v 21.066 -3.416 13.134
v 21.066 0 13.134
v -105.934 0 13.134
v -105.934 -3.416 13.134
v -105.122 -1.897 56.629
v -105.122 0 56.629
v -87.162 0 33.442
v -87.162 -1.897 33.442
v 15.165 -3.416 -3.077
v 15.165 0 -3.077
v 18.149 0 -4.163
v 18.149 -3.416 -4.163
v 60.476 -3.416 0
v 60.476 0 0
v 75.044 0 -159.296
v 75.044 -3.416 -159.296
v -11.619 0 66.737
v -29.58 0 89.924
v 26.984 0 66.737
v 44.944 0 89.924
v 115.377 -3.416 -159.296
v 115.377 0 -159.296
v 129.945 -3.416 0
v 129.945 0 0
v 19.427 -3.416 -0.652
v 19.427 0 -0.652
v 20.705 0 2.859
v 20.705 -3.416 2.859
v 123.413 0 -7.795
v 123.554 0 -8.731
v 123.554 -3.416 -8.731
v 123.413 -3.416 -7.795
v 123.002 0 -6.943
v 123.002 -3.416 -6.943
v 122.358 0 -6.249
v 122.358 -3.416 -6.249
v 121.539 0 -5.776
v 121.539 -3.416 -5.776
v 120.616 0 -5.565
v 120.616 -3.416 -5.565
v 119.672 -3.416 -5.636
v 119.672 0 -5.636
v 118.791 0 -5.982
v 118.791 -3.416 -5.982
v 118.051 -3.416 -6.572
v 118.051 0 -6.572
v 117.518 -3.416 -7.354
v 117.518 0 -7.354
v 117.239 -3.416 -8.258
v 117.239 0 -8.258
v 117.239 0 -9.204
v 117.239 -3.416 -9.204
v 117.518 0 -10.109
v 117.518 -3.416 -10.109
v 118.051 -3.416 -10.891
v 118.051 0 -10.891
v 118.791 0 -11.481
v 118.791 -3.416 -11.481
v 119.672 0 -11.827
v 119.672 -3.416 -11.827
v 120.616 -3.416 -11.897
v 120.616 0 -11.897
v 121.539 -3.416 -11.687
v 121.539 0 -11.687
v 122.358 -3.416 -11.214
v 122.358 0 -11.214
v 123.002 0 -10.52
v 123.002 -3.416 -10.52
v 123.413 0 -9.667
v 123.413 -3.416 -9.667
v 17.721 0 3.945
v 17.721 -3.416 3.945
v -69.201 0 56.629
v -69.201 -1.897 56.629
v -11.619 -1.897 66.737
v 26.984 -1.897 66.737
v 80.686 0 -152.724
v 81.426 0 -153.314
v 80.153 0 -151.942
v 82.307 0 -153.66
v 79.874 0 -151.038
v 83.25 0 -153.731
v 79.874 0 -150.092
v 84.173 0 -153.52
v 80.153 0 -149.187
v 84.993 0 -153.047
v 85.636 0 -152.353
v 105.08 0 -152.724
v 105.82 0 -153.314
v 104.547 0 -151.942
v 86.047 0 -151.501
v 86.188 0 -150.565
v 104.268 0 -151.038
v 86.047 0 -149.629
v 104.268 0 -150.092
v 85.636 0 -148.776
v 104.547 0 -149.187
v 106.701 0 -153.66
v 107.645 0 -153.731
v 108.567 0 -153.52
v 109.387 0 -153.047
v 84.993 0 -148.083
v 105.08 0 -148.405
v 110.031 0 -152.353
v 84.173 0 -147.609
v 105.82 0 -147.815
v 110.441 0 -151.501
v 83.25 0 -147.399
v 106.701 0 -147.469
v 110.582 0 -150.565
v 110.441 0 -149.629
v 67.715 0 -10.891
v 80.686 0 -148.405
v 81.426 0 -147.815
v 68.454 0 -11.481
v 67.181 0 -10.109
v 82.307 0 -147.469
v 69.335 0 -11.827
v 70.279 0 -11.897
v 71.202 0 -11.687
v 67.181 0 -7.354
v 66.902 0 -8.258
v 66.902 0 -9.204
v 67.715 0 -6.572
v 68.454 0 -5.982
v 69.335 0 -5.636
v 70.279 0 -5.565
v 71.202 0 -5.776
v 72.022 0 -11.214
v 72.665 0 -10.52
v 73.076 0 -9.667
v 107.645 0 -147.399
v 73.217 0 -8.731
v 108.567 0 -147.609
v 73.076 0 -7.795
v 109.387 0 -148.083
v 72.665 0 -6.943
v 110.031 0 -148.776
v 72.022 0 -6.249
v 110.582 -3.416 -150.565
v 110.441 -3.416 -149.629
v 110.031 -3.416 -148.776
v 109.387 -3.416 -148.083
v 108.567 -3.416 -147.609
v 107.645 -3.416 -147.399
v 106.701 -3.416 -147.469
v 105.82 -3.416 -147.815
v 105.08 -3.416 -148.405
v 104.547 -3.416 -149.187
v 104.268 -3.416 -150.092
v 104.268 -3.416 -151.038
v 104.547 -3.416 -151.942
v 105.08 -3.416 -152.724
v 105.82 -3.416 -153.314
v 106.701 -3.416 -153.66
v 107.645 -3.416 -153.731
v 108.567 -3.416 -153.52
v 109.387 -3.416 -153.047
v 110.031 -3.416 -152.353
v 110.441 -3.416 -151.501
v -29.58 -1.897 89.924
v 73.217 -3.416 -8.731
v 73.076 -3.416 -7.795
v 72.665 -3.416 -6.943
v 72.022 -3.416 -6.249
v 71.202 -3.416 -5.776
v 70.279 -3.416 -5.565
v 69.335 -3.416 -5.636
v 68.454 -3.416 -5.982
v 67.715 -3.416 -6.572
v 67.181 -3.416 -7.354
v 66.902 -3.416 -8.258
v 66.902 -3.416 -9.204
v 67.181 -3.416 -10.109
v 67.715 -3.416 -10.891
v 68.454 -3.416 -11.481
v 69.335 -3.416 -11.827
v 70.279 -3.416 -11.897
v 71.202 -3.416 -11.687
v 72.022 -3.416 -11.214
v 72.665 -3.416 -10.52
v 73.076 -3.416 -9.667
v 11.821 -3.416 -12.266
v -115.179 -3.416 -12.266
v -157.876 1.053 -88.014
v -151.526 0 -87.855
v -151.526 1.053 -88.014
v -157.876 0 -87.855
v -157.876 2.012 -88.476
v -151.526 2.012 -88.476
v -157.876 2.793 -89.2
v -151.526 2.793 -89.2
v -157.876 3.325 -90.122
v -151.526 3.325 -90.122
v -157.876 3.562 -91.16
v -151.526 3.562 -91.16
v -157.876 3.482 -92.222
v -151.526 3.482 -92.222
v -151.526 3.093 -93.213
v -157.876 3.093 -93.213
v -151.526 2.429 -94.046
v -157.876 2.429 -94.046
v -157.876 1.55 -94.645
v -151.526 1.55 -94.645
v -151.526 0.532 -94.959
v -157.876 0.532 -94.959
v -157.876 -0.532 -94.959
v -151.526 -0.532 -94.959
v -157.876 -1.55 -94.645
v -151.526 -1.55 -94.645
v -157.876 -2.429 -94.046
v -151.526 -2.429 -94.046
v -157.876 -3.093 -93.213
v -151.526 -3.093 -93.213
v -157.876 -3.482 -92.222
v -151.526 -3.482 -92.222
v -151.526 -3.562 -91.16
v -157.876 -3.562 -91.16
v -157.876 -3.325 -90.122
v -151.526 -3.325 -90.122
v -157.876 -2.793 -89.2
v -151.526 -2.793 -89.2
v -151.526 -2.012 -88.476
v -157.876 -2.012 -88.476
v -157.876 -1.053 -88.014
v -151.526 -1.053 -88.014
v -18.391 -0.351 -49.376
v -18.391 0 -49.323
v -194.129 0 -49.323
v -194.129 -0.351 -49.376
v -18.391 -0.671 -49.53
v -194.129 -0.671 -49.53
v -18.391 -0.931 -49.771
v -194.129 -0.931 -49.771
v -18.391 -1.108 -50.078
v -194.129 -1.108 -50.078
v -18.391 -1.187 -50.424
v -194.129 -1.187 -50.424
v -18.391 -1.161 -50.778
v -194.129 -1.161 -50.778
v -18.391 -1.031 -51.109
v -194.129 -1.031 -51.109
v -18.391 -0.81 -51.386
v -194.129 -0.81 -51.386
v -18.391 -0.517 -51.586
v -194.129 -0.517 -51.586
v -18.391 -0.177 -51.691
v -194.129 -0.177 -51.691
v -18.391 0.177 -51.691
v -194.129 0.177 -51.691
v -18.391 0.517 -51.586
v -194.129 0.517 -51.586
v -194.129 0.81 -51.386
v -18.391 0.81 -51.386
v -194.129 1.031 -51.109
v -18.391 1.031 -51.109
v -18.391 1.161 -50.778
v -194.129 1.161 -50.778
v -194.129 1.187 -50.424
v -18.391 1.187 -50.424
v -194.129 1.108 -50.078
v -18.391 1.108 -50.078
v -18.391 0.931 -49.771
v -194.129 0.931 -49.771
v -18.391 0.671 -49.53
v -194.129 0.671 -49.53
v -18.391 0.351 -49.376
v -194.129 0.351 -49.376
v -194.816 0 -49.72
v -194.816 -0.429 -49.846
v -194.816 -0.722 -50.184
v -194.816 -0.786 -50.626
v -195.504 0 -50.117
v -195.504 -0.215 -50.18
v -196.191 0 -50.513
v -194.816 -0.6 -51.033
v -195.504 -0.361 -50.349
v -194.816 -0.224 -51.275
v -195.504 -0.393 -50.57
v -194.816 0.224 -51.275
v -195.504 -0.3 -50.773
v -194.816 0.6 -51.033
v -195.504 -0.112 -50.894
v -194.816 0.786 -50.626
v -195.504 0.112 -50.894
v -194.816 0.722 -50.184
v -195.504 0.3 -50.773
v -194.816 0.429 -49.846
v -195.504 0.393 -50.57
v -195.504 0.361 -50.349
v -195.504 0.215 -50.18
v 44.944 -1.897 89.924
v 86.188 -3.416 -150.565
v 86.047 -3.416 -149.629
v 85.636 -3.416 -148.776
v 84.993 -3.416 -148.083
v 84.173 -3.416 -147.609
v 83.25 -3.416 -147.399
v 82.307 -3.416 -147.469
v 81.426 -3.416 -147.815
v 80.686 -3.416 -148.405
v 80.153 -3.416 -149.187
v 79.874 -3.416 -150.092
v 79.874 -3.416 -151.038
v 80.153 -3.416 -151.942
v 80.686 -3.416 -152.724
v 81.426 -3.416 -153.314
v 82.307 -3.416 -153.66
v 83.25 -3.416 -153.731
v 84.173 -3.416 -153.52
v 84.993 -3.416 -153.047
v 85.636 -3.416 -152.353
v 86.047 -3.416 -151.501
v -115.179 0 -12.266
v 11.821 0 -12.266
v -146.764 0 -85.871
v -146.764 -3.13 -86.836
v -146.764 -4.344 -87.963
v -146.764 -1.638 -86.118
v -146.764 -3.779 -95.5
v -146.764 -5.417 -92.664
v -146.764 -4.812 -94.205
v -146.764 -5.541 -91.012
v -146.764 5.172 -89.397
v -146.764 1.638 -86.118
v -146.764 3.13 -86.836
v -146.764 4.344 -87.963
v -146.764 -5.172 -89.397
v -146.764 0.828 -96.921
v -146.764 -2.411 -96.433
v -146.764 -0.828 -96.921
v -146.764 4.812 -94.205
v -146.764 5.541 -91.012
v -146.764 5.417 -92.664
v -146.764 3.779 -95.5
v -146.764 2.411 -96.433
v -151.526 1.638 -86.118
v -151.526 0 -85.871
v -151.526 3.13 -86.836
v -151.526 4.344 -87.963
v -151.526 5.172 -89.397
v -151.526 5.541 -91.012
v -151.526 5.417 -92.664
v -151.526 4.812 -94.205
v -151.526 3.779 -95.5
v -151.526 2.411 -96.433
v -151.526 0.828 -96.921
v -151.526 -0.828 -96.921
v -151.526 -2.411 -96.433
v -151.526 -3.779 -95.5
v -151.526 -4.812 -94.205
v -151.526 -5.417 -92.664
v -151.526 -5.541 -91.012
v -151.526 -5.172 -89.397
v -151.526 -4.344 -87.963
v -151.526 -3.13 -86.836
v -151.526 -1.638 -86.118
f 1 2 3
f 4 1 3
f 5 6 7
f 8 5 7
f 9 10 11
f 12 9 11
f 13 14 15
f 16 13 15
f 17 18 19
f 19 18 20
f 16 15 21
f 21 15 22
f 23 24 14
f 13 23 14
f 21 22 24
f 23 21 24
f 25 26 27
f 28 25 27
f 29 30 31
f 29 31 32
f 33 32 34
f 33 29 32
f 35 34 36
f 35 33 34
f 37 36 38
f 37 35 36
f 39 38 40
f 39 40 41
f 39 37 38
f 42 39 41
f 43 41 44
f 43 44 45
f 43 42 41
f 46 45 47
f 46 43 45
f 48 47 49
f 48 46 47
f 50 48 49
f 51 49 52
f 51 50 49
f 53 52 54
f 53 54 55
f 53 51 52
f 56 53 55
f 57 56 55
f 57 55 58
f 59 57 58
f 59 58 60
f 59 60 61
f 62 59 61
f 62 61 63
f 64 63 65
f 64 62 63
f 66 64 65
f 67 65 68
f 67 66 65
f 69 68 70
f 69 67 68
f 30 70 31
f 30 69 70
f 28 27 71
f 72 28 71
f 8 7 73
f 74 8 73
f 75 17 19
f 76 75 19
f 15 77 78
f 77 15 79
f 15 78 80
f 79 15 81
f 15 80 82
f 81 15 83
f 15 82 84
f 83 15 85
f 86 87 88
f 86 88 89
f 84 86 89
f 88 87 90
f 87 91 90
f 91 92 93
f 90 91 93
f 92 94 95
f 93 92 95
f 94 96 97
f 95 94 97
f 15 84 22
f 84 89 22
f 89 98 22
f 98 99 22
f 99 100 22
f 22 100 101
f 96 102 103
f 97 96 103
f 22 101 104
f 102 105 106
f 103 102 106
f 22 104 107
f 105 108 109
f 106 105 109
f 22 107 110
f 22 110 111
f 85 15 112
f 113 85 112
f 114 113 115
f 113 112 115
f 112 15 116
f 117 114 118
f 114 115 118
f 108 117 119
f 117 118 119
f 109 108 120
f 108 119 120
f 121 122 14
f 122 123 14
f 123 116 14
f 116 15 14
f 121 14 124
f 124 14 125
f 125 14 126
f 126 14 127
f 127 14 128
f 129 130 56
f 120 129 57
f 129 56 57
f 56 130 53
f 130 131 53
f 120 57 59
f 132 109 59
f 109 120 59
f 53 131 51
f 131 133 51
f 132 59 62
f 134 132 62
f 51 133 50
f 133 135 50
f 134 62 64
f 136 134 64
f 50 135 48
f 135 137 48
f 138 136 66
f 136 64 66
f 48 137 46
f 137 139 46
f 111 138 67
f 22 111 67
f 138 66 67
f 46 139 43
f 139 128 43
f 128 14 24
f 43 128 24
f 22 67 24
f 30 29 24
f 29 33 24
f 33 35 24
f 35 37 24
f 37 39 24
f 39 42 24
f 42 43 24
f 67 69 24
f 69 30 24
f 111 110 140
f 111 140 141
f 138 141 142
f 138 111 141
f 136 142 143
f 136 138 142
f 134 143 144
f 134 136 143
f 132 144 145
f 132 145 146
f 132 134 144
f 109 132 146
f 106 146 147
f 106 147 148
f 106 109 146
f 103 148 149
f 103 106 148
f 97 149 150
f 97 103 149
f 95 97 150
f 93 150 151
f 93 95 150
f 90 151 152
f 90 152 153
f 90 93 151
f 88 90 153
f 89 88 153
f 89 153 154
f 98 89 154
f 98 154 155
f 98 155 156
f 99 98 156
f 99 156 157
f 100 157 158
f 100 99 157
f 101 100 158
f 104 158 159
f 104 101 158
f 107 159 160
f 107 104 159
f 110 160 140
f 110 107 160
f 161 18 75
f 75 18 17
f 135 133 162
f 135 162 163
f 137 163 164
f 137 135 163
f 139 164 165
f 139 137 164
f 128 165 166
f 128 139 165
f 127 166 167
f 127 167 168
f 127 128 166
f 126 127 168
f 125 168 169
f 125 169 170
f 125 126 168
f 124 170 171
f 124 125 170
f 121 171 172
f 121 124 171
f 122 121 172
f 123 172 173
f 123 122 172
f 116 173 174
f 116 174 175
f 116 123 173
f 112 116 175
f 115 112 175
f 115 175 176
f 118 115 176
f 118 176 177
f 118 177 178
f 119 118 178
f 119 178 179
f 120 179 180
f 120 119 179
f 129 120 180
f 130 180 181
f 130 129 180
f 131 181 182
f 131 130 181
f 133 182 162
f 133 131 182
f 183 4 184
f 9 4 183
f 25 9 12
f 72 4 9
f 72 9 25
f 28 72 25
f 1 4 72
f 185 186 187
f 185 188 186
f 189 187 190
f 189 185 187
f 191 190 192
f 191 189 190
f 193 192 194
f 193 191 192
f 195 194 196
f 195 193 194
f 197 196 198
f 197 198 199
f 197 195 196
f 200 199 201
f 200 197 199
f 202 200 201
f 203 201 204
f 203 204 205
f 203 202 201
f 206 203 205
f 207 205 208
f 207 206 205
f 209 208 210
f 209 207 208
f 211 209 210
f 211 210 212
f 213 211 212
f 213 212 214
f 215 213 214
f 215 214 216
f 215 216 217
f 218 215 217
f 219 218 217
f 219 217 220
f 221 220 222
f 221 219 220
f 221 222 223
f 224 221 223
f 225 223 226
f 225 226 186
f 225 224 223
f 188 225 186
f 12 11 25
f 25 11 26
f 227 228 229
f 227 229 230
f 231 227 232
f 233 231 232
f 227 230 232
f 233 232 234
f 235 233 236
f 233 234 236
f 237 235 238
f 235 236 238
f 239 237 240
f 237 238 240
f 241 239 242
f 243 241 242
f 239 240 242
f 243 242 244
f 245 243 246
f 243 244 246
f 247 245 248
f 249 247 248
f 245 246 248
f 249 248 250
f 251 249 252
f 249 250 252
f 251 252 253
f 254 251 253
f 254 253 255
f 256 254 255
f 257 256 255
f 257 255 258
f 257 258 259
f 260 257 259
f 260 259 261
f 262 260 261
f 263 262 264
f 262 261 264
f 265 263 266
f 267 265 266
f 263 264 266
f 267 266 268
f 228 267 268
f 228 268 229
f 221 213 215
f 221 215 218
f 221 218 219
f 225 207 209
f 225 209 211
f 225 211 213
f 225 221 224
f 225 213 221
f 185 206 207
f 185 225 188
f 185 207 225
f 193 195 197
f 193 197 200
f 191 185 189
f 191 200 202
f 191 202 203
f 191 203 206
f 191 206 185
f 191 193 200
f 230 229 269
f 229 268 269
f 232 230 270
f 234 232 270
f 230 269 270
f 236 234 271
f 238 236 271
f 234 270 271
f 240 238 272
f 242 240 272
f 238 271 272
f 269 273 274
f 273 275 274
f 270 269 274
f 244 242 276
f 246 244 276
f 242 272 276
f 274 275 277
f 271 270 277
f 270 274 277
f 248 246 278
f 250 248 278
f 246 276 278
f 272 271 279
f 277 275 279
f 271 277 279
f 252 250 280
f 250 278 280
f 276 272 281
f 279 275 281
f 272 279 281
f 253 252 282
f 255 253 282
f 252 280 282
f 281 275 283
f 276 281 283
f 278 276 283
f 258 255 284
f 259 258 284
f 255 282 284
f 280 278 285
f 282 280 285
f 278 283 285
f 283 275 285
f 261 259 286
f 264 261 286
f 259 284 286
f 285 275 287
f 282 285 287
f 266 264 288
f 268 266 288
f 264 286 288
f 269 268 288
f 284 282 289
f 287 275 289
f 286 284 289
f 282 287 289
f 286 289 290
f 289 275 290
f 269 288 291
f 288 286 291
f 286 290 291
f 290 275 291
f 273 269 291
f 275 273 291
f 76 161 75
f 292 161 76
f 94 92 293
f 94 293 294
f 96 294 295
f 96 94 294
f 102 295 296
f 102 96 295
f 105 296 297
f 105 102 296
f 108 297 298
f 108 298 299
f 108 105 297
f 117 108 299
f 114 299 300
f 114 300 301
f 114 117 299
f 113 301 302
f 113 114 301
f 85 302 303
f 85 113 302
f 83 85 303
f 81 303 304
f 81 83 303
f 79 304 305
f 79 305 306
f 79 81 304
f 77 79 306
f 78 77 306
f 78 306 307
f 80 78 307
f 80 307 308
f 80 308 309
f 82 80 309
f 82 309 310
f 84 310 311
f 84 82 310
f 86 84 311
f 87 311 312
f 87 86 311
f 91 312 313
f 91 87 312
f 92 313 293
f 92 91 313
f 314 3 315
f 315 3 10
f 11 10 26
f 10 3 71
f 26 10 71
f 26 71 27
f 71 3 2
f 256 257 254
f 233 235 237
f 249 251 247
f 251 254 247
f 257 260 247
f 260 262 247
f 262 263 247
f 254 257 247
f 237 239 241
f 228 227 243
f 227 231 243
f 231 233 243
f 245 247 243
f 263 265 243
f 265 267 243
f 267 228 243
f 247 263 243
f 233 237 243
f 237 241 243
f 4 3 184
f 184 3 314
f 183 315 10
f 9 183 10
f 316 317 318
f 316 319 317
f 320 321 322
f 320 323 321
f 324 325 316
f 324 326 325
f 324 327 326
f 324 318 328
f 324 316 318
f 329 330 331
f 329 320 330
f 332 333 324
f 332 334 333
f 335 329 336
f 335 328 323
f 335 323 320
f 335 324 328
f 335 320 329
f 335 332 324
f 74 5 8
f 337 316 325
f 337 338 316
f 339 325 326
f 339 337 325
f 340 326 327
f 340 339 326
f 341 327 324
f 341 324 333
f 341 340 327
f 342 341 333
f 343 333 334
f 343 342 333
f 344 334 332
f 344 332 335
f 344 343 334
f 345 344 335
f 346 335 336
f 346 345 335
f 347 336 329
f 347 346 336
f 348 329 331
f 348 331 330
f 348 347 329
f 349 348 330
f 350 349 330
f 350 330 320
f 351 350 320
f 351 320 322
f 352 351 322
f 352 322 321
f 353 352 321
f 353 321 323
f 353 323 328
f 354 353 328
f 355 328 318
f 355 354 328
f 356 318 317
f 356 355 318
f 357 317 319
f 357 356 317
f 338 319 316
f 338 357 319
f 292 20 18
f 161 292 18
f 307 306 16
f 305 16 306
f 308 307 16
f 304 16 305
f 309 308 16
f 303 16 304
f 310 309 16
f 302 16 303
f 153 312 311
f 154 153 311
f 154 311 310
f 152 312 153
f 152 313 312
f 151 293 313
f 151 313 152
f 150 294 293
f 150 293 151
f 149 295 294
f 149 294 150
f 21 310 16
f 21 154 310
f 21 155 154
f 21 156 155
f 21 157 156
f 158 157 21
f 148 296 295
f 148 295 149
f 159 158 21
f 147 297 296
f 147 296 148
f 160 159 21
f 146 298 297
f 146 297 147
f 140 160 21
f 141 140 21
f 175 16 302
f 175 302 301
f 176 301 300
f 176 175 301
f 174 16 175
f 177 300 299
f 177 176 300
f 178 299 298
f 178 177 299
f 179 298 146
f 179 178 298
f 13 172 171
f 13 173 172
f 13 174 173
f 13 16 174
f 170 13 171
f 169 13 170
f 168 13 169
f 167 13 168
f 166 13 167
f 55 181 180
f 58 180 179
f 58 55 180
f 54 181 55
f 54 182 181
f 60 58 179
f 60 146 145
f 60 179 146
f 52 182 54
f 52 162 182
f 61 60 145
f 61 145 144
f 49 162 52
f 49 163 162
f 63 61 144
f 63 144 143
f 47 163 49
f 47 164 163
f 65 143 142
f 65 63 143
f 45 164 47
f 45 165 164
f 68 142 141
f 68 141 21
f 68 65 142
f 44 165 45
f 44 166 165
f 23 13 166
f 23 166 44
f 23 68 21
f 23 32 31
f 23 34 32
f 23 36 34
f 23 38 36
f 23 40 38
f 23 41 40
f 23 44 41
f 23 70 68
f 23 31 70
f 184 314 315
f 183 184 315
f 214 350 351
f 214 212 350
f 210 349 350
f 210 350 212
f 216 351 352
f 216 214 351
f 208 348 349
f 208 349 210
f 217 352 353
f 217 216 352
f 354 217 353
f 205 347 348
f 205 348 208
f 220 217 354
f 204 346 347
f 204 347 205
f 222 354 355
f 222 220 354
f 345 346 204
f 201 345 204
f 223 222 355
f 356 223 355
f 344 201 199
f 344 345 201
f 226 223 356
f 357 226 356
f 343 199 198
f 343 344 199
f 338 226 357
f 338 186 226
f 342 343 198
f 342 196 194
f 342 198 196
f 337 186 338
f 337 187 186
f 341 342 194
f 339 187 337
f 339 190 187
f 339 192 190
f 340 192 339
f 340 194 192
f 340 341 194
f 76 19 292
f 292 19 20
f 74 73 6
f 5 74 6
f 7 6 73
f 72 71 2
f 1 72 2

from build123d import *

# Parameters (mm, degrees)
F1_DEPTH = 3.4163
F3_DEPTH = 1.89738
F5_DEPTH = 1.89738
F6_R     = 3.175
F7_DEPTH = 3.4163


with BuildPart() as f1:
    # F0 (on Front) → F1 (new body)
    with BuildSketch(Plane.XZ):
        Polygon((-115.179243, -12.266104), (11.820757, -12.266104), (15.165372, -3.076849), (18.148896, -4.162763), (19.426703, -0.652018), (20.70451, 2.858728), (17.720986, 3.944642), (21.065601, 13.133896), (-105.934399, 13.133896), align=None)
    extrude(amount=F1_DEPTH)


with BuildPart() as f3:
    # F2 (on Front) → F3 (new body)
    with BuildSketch(Plane.XZ):
        Polygon((-87.161818, 56.629179), (-105.122158, 56.629179), (-87.161818, 33.442141), (-69.201478, 56.629179), align=None)
    extrude(amount=F3_DEPTH)


with BuildPart() as f5:
    # F4 (on Front) → F5 (new body)
    with BuildSketch(Plane.XZ):
        Polygon((-11.619255, 89.924287), (-29.579595, 89.924287), (-11.619255, 66.737249), (6.341085, 89.924287), align=None)
        Polygon((6.341085, 89.924287), (-11.619255, 66.737249), (26.983665, 66.737249), (9.023325, 89.924287), align=None)
        Polygon((9.023325, 89.924287), (26.983665, 66.737249), (44.944005, 89.924287), (26.983665, 89.924287), align=None)
    extrude(amount=F5_DEPTH)


with BuildPart() as f7:
    # F6 (on Front) → F7 (new body)
    with BuildSketch(Plane.XZ):
        Polygon((75.043939, -159.2961), (95.210269, -159.2961), (115.376599, -159.2961), (129.944769, 0), (95.210269, 0), (60.475769, 0), align=None)
        with Locations((83.013124, -150.56485)):
            Circle(F6_R, mode=Mode.SUBTRACT)
        with Locations((107.407415, -150.56485)):
            Circle(F6_R, mode=Mode.SUBTRACT)
        with Locations((70.041959, -8.73125)):
            Circle(F6_R, mode=Mode.SUBTRACT)
        with Locations((120.37858, -8.73125)):
            Circle(F6_R, mode=Mode.SUBTRACT)
    extrude(amount=F7_DEPTH)


with BuildPart() as f9:
    # F8 (on Front) → F9 (revolve)
    with BuildSketch(Plane.XZ):
        Polygon((-151.526353, -87.855293), (-157.876353, -87.855293), (-157.876353, -91.427168), (-146.763853, -91.427168), (-146.763853, -85.870918), (-151.526353, -85.870918), align=None)
    revolve(axis=Axis((-152.320103, 0, -91.427168), (-1, 0, 0)))


with BuildPart() as f11:
    # F10 (on Front) → F11 (revolve)
    with BuildSketch(Plane.XZ):
        Polygon((-194.128768, -49.322808), (-196.190991, -50.513433), (-18.390991, -50.513433), (-18.390991, -49.322808), align=None)
    revolve(axis=Axis((-107.290991, 0, -50.513433), (1, 0, 0)))


solid = Compound([f1.part, f3.part, f5.part, f7.part, f9.part, f11.part])
